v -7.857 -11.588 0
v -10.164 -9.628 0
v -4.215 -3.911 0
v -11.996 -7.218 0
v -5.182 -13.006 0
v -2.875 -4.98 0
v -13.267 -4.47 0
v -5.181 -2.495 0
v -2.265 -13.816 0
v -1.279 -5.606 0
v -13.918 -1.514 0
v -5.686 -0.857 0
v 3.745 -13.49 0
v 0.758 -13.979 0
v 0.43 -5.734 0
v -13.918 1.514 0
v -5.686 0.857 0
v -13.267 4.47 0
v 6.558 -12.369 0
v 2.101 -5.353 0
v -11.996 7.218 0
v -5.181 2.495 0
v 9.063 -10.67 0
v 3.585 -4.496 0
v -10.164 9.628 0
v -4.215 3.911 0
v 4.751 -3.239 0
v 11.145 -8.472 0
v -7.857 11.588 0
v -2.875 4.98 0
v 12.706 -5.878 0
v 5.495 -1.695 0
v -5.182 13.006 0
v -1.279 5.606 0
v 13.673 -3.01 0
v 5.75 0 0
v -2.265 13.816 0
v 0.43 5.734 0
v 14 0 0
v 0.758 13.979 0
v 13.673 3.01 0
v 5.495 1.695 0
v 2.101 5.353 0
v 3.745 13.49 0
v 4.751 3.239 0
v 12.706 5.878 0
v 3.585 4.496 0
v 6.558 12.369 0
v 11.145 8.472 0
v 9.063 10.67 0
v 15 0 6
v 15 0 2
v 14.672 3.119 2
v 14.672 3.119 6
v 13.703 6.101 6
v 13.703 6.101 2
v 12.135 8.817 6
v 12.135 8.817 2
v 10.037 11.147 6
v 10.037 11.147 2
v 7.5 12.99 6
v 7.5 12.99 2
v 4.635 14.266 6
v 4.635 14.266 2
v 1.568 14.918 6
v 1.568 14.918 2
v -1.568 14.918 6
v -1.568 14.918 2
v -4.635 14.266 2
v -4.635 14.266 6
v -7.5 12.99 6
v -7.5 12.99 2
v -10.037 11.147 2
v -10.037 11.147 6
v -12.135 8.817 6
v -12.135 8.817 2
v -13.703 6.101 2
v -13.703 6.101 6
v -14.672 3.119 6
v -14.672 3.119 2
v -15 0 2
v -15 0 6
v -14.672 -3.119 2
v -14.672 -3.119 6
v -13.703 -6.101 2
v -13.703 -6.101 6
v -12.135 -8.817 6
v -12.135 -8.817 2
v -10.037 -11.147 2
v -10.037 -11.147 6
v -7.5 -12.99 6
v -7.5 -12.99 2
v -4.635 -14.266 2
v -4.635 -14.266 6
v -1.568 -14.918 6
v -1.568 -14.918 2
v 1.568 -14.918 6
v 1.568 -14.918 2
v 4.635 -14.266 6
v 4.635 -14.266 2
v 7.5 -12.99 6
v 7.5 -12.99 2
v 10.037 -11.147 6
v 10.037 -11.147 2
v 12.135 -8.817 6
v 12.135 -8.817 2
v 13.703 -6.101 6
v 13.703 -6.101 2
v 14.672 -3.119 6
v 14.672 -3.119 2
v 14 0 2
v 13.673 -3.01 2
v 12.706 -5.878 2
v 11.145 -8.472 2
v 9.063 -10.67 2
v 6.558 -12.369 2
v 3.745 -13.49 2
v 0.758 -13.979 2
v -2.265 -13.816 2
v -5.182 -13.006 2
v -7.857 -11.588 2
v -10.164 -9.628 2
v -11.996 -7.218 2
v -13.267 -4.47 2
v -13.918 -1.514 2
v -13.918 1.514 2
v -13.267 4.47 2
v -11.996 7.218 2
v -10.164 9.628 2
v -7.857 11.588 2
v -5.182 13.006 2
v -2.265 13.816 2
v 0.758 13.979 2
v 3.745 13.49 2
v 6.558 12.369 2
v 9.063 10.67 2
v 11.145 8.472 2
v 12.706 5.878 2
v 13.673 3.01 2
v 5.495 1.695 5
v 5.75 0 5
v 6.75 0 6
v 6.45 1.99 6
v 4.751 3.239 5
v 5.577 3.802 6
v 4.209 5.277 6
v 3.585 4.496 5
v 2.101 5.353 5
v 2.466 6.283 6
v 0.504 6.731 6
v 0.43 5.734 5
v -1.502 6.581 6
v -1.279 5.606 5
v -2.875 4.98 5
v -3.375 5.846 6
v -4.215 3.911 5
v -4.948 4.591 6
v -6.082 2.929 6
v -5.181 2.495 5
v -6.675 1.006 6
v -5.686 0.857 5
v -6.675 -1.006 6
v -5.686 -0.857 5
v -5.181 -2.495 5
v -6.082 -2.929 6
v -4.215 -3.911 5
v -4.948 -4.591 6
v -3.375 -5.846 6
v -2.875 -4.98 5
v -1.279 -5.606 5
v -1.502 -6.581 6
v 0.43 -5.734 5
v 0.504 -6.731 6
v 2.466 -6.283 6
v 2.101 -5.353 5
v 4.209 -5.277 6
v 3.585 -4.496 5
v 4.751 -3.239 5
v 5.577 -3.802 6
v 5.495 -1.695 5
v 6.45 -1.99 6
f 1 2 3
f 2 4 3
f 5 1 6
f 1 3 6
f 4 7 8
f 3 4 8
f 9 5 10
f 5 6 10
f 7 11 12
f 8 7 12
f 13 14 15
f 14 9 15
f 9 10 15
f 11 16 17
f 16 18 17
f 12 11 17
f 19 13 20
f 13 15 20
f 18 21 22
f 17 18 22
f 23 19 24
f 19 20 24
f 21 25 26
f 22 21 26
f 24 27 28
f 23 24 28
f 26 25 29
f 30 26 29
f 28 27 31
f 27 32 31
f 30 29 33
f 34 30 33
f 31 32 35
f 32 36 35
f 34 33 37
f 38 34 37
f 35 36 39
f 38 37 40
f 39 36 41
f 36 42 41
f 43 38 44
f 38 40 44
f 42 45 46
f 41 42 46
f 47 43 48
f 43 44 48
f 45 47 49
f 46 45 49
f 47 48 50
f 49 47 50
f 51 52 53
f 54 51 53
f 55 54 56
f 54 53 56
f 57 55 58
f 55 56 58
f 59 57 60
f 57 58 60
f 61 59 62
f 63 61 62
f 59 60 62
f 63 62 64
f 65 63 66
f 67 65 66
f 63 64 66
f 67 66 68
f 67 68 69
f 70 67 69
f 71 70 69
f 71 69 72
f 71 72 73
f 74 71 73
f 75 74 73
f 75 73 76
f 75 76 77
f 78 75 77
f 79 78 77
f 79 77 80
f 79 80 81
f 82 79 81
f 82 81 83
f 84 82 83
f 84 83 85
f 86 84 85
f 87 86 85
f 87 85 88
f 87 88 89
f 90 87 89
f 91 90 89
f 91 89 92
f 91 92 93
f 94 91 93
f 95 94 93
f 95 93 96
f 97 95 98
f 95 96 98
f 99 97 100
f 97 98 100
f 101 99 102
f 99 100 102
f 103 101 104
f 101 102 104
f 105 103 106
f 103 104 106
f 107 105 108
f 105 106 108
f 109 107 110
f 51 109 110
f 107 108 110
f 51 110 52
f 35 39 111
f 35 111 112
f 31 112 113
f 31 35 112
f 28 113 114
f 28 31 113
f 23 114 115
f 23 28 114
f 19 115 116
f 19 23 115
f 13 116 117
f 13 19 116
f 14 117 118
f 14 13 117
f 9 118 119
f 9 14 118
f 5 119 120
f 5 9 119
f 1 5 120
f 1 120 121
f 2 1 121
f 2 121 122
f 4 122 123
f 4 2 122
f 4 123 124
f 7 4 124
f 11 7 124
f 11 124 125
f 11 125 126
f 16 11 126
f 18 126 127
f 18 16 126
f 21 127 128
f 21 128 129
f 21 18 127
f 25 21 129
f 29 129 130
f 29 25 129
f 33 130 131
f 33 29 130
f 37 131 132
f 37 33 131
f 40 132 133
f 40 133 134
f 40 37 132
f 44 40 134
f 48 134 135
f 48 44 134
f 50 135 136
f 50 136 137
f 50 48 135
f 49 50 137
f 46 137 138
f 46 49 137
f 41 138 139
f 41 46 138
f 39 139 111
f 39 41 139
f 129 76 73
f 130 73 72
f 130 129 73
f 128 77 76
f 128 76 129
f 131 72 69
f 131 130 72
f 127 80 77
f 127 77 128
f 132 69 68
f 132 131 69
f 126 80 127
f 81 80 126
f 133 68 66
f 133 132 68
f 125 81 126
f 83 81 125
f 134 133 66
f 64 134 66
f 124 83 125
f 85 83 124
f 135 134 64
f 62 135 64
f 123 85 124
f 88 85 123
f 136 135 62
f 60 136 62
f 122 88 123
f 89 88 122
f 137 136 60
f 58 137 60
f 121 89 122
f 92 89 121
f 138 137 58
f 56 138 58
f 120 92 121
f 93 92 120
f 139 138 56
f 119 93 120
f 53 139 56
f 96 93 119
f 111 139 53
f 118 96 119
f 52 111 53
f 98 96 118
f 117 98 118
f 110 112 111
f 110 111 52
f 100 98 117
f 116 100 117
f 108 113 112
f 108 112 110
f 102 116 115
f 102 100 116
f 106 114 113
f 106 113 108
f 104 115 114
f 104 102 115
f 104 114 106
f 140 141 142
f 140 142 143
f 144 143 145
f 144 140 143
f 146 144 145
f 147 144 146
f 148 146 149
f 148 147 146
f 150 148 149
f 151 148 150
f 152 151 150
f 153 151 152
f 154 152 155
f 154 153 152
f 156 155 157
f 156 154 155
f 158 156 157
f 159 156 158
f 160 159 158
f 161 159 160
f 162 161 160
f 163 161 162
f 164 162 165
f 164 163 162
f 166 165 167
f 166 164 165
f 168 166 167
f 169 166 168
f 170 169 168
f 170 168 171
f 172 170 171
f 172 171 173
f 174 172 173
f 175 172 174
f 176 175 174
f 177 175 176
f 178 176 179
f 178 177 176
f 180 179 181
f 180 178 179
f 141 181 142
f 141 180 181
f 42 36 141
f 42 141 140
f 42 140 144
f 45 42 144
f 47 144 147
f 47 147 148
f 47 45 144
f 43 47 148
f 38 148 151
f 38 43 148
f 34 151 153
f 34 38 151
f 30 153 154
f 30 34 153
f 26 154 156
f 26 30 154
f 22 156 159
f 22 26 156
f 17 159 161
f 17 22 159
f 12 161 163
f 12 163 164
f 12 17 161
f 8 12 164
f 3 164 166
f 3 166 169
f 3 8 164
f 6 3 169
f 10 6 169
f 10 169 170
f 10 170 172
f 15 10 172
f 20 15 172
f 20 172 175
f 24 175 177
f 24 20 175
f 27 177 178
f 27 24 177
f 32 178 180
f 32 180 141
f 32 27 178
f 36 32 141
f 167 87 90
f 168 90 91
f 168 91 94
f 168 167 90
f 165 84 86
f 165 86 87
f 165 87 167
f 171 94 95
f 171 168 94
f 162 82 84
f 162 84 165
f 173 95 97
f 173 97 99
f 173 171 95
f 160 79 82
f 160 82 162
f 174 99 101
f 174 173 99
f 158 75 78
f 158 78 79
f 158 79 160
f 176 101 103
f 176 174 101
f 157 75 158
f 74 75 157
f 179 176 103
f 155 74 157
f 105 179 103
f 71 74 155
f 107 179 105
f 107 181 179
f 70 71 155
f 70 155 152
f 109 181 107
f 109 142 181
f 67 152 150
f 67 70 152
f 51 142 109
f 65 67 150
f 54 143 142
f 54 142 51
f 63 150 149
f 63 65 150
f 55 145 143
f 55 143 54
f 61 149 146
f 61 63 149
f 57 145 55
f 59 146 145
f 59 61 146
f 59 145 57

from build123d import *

# Parameters (mm, degrees)
F0_R     = 15
F0_R_2   = 5.75
F1_DEPTH = 6
F2_R     = 15
F2_R_2   = 14
F3_DEPTH = 2
F4_SIZE  = 1


with BuildPart() as f1:
    # F0 (on Top) → F1 (new body)
    with BuildSketch(Plane.XY):
        Circle(F0_R)
        Circle(F0_R_2, mode=Mode.SUBTRACT)
    extrude(amount=F1_DEPTH)

    # F2 (on face) → F3 (cut)
    with BuildSketch(Plane(origin=(0, 0, 0), x_dir=(1, 0, 0), z_dir=(0, 0, -1))):
        Circle(F2_R)
        Circle(F2_R_2, mode=Mode.SUBTRACT)
    extrude(amount=-F3_DEPTH, mode=Mode.SUBTRACT)

    # F4
    f4_edges = [f1.edges().sort_by_distance(p)[0] for p in [
        (-5.75, 0, 6),
    ]]
    chamfer(f4_edges, length=F4_SIZE)


solid = f1.part
